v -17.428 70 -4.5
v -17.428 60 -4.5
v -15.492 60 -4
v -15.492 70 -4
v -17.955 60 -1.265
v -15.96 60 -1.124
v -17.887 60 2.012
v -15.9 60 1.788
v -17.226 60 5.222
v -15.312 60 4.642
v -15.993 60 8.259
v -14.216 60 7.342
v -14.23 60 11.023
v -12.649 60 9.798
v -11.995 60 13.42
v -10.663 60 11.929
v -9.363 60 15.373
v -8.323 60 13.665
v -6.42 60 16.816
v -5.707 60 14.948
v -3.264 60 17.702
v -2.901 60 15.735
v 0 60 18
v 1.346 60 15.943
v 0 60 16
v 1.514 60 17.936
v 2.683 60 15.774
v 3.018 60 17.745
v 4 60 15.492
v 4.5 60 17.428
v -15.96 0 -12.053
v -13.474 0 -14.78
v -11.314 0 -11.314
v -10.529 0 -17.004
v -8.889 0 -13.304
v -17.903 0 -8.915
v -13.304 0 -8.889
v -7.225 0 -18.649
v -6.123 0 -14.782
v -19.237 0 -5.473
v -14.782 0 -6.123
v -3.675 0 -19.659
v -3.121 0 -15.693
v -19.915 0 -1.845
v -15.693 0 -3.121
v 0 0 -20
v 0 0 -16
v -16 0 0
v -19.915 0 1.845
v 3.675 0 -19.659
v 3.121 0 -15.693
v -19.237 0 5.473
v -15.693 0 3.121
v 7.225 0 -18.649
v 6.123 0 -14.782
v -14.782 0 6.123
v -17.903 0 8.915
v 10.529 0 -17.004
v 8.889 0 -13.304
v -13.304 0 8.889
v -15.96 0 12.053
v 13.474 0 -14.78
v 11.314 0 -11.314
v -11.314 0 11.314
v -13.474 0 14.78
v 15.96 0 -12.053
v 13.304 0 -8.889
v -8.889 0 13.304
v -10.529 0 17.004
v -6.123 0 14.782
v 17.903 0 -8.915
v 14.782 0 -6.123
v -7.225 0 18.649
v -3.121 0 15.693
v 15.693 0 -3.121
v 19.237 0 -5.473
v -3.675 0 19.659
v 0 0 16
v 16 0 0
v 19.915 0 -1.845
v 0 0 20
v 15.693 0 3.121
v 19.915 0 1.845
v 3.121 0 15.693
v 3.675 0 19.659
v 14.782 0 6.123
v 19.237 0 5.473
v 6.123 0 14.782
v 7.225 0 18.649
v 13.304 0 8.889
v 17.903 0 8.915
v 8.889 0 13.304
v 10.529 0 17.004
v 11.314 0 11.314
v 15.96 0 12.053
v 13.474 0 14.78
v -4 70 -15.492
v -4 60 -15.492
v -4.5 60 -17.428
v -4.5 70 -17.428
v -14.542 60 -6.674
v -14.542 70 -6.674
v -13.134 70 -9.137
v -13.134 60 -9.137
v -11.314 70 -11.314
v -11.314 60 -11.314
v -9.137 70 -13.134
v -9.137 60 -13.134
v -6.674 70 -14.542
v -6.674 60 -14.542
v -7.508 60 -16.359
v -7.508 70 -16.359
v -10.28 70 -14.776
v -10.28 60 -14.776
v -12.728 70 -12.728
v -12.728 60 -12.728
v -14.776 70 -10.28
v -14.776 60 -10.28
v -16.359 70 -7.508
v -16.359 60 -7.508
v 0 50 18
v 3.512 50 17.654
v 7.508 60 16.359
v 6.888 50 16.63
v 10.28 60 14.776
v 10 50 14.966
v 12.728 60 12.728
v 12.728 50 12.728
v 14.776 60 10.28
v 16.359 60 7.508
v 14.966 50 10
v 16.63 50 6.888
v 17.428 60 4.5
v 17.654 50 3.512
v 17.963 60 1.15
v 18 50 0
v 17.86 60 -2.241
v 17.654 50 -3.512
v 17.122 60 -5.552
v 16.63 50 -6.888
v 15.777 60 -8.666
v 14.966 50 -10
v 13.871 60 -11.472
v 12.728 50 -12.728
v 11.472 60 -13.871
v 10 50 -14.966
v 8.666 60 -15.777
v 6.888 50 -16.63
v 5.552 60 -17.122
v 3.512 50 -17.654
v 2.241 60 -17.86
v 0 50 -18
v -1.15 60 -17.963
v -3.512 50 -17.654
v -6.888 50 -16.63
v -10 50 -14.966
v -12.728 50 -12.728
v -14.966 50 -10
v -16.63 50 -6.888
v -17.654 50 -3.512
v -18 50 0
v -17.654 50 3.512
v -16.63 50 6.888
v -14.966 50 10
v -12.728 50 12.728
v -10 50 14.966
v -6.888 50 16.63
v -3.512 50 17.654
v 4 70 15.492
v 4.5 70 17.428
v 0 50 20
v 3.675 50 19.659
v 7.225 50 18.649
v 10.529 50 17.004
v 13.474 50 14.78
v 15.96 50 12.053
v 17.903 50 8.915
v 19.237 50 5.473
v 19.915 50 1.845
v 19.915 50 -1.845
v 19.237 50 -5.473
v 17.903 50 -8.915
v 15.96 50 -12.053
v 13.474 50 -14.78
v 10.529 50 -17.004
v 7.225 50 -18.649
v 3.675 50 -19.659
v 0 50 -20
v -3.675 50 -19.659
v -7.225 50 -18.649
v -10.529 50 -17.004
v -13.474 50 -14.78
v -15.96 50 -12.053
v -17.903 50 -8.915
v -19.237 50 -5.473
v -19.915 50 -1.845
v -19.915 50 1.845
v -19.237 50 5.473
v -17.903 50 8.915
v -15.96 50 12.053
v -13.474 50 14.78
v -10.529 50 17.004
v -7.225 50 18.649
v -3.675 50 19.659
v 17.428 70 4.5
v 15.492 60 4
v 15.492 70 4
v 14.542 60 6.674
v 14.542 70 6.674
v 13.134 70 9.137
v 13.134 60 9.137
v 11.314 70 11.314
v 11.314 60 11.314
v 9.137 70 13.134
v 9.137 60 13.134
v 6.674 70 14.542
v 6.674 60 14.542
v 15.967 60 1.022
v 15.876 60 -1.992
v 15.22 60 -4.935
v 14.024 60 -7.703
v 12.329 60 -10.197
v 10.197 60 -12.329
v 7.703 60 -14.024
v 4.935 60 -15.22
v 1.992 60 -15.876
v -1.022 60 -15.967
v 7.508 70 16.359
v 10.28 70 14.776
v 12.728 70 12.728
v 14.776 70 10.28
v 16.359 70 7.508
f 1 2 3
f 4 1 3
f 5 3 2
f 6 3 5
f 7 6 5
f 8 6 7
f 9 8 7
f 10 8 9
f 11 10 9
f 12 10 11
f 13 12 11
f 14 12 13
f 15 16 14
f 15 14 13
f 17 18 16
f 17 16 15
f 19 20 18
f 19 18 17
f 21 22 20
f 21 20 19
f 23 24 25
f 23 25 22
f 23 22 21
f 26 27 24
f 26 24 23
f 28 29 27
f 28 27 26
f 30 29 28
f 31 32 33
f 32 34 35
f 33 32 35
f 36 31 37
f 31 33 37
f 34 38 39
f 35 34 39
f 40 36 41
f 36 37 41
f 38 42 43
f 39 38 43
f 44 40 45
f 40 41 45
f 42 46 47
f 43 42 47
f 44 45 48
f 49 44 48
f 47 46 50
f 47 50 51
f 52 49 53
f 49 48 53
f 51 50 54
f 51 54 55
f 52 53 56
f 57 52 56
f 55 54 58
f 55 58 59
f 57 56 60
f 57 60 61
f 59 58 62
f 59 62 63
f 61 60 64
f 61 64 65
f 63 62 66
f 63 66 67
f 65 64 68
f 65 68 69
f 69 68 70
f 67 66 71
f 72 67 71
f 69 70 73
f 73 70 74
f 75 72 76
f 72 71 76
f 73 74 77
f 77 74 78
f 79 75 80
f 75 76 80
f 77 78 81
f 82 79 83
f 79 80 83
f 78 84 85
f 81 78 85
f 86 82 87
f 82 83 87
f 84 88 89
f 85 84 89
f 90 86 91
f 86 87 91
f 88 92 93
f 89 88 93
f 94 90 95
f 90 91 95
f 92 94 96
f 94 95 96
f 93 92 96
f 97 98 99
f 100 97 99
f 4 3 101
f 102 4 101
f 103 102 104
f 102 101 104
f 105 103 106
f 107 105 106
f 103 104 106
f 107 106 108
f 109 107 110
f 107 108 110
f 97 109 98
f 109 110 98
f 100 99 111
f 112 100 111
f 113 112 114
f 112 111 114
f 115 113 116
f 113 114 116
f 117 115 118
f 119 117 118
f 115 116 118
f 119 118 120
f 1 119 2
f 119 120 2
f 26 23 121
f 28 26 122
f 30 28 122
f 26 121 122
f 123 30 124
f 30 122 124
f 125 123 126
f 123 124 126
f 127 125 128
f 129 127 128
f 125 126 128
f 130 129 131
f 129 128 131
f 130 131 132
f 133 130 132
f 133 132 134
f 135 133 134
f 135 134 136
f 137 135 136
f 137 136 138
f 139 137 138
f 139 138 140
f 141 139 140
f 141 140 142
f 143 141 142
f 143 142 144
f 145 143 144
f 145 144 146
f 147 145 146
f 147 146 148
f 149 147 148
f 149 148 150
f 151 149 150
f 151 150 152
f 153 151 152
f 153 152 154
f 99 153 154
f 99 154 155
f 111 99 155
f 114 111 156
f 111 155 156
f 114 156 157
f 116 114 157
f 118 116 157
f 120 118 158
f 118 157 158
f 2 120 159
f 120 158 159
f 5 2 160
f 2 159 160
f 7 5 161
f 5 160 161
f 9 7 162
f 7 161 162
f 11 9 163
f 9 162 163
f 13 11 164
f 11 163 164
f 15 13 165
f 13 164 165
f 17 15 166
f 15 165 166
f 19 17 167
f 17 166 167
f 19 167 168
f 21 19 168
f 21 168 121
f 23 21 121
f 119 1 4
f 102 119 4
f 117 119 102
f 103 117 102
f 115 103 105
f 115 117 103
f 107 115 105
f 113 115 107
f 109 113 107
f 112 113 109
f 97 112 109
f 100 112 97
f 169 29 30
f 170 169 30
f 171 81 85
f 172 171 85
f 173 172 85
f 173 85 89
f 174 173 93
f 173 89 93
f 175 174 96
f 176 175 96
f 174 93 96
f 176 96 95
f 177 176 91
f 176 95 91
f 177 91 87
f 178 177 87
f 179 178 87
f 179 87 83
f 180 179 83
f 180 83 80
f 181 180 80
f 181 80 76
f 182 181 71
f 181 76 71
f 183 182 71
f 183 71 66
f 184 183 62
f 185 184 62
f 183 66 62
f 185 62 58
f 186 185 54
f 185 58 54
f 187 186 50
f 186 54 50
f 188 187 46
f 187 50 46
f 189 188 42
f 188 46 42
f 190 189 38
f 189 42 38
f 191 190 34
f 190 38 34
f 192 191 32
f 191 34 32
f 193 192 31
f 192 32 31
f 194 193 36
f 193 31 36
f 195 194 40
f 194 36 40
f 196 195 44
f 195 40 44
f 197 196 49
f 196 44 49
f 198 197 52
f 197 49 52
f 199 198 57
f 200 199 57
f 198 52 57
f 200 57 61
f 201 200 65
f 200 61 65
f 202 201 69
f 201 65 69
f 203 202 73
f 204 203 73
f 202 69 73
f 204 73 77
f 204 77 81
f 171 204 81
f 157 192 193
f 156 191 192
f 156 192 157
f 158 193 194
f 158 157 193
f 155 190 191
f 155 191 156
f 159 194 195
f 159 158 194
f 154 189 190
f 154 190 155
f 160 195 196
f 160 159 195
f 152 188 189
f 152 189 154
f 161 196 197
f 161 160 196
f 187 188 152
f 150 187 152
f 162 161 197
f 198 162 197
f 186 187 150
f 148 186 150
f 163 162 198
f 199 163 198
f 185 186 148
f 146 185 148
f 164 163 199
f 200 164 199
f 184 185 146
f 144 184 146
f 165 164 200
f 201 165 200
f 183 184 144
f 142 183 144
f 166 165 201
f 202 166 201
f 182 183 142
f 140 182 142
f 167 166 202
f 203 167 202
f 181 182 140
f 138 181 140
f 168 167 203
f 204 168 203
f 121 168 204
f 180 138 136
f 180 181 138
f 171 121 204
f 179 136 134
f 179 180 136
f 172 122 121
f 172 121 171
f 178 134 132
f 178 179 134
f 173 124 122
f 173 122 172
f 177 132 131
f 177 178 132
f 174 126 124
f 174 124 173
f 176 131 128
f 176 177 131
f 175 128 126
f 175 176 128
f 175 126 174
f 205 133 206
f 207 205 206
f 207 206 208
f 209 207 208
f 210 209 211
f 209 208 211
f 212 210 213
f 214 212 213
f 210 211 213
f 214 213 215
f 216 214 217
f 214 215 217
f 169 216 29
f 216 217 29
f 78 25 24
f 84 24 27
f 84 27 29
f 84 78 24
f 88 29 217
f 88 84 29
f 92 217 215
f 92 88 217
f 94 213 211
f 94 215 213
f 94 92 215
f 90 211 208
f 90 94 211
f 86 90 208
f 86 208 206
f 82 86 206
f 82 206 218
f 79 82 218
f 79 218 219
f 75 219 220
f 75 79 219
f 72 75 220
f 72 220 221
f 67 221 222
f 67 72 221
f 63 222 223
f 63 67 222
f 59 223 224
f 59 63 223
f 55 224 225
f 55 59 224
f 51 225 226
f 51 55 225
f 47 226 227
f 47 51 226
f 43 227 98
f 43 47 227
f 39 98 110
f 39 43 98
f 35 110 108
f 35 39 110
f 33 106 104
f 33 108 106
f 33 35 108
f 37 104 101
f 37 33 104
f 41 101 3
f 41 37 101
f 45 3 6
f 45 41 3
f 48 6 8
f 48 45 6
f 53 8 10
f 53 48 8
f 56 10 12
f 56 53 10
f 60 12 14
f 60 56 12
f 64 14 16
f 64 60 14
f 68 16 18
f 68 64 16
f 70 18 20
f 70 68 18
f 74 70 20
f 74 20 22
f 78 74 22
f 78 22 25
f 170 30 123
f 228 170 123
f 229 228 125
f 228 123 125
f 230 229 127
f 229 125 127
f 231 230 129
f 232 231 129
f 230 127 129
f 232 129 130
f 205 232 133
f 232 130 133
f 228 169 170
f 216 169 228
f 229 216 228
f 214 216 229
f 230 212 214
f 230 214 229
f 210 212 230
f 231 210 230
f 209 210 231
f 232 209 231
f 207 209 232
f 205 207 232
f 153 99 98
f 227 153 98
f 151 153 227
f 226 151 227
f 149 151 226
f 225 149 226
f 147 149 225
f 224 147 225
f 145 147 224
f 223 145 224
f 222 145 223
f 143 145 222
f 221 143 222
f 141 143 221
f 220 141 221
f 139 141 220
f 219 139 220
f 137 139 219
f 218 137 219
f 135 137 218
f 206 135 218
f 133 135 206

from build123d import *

# Parameters (mm, degrees)
SKETCH_1_R      = 20
SKETCH_1_R_2    = 16
EXTRUDE_1_DEPTH = 50
EXTRUDE_START   = 50
SKETCH_3_R      = 18
SKETCH_3_R_2    = 16
EXTRUDE_2_DEPTH = 10
EXTRUDE_START_2 = 60
EXTRUDE_3_DEPTH = 10


with BuildPart() as part:
    # 草图1 → 凸台-拉伸1 (new body)
    with BuildSketch(Plane(origin=(0, 0, 0), x_dir=(1, 0, 0), z_dir=(0, 1, 0))):
        Circle(SKETCH_1_R)
        Circle(SKETCH_1_R_2, mode=Mode.SUBTRACT)
    extrude(amount=EXTRUDE_1_DEPTH)

    # 草图3 → 凸台-拉伸2 (add)
    with BuildSketch(Plane(origin=(0, 0, 0), x_dir=(1, 0, 0), z_dir=(0, 1, 0)).offset(EXTRUDE_START)):
        Circle(SKETCH_3_R)
        Circle(SKETCH_3_R_2, mode=Mode.SUBTRACT)
    extrude(amount=EXTRUDE_2_DEPTH)

    # 草图4 → 凸台-拉伸3 (add)
    with BuildSketch(Plane(origin=(0, 0, 0), x_dir=(1, 0, 0), z_dir=(0, 1, 0)).offset(EXTRUDE_START_2)):
        with BuildLine():
            Line((-17.428425058, 4.5), (-15.491933385, 4))
            ThreePointArc((-15.491933385, 4), (-11.313708499, 11.313708499), (-4, 15.491933385))
            Line((-4, 15.491933385), (-4.5, 17.428425058))
            ThreePointArc((-4.5, 17.428425058), (-12.727922061, 12.727922061), (-17.428425058, 4.5))
        make_face()
        with BuildLine():
            ThreePointArc((15.491933385, -4), (11.313708499, -11.313708499), (4, -15.491933385))
            Line((4, -15.491933385), (4.5, -17.428425058))
            ThreePointArc((4.5, -17.428425058), (12.727922061, -12.727922061), (17.428425058, -4.5))
            Line((17.428425058, -4.5), (15.491933385, -4))
        make_face()
    extrude(amount=EXTRUDE_3_DEPTH)


solid = part.part
